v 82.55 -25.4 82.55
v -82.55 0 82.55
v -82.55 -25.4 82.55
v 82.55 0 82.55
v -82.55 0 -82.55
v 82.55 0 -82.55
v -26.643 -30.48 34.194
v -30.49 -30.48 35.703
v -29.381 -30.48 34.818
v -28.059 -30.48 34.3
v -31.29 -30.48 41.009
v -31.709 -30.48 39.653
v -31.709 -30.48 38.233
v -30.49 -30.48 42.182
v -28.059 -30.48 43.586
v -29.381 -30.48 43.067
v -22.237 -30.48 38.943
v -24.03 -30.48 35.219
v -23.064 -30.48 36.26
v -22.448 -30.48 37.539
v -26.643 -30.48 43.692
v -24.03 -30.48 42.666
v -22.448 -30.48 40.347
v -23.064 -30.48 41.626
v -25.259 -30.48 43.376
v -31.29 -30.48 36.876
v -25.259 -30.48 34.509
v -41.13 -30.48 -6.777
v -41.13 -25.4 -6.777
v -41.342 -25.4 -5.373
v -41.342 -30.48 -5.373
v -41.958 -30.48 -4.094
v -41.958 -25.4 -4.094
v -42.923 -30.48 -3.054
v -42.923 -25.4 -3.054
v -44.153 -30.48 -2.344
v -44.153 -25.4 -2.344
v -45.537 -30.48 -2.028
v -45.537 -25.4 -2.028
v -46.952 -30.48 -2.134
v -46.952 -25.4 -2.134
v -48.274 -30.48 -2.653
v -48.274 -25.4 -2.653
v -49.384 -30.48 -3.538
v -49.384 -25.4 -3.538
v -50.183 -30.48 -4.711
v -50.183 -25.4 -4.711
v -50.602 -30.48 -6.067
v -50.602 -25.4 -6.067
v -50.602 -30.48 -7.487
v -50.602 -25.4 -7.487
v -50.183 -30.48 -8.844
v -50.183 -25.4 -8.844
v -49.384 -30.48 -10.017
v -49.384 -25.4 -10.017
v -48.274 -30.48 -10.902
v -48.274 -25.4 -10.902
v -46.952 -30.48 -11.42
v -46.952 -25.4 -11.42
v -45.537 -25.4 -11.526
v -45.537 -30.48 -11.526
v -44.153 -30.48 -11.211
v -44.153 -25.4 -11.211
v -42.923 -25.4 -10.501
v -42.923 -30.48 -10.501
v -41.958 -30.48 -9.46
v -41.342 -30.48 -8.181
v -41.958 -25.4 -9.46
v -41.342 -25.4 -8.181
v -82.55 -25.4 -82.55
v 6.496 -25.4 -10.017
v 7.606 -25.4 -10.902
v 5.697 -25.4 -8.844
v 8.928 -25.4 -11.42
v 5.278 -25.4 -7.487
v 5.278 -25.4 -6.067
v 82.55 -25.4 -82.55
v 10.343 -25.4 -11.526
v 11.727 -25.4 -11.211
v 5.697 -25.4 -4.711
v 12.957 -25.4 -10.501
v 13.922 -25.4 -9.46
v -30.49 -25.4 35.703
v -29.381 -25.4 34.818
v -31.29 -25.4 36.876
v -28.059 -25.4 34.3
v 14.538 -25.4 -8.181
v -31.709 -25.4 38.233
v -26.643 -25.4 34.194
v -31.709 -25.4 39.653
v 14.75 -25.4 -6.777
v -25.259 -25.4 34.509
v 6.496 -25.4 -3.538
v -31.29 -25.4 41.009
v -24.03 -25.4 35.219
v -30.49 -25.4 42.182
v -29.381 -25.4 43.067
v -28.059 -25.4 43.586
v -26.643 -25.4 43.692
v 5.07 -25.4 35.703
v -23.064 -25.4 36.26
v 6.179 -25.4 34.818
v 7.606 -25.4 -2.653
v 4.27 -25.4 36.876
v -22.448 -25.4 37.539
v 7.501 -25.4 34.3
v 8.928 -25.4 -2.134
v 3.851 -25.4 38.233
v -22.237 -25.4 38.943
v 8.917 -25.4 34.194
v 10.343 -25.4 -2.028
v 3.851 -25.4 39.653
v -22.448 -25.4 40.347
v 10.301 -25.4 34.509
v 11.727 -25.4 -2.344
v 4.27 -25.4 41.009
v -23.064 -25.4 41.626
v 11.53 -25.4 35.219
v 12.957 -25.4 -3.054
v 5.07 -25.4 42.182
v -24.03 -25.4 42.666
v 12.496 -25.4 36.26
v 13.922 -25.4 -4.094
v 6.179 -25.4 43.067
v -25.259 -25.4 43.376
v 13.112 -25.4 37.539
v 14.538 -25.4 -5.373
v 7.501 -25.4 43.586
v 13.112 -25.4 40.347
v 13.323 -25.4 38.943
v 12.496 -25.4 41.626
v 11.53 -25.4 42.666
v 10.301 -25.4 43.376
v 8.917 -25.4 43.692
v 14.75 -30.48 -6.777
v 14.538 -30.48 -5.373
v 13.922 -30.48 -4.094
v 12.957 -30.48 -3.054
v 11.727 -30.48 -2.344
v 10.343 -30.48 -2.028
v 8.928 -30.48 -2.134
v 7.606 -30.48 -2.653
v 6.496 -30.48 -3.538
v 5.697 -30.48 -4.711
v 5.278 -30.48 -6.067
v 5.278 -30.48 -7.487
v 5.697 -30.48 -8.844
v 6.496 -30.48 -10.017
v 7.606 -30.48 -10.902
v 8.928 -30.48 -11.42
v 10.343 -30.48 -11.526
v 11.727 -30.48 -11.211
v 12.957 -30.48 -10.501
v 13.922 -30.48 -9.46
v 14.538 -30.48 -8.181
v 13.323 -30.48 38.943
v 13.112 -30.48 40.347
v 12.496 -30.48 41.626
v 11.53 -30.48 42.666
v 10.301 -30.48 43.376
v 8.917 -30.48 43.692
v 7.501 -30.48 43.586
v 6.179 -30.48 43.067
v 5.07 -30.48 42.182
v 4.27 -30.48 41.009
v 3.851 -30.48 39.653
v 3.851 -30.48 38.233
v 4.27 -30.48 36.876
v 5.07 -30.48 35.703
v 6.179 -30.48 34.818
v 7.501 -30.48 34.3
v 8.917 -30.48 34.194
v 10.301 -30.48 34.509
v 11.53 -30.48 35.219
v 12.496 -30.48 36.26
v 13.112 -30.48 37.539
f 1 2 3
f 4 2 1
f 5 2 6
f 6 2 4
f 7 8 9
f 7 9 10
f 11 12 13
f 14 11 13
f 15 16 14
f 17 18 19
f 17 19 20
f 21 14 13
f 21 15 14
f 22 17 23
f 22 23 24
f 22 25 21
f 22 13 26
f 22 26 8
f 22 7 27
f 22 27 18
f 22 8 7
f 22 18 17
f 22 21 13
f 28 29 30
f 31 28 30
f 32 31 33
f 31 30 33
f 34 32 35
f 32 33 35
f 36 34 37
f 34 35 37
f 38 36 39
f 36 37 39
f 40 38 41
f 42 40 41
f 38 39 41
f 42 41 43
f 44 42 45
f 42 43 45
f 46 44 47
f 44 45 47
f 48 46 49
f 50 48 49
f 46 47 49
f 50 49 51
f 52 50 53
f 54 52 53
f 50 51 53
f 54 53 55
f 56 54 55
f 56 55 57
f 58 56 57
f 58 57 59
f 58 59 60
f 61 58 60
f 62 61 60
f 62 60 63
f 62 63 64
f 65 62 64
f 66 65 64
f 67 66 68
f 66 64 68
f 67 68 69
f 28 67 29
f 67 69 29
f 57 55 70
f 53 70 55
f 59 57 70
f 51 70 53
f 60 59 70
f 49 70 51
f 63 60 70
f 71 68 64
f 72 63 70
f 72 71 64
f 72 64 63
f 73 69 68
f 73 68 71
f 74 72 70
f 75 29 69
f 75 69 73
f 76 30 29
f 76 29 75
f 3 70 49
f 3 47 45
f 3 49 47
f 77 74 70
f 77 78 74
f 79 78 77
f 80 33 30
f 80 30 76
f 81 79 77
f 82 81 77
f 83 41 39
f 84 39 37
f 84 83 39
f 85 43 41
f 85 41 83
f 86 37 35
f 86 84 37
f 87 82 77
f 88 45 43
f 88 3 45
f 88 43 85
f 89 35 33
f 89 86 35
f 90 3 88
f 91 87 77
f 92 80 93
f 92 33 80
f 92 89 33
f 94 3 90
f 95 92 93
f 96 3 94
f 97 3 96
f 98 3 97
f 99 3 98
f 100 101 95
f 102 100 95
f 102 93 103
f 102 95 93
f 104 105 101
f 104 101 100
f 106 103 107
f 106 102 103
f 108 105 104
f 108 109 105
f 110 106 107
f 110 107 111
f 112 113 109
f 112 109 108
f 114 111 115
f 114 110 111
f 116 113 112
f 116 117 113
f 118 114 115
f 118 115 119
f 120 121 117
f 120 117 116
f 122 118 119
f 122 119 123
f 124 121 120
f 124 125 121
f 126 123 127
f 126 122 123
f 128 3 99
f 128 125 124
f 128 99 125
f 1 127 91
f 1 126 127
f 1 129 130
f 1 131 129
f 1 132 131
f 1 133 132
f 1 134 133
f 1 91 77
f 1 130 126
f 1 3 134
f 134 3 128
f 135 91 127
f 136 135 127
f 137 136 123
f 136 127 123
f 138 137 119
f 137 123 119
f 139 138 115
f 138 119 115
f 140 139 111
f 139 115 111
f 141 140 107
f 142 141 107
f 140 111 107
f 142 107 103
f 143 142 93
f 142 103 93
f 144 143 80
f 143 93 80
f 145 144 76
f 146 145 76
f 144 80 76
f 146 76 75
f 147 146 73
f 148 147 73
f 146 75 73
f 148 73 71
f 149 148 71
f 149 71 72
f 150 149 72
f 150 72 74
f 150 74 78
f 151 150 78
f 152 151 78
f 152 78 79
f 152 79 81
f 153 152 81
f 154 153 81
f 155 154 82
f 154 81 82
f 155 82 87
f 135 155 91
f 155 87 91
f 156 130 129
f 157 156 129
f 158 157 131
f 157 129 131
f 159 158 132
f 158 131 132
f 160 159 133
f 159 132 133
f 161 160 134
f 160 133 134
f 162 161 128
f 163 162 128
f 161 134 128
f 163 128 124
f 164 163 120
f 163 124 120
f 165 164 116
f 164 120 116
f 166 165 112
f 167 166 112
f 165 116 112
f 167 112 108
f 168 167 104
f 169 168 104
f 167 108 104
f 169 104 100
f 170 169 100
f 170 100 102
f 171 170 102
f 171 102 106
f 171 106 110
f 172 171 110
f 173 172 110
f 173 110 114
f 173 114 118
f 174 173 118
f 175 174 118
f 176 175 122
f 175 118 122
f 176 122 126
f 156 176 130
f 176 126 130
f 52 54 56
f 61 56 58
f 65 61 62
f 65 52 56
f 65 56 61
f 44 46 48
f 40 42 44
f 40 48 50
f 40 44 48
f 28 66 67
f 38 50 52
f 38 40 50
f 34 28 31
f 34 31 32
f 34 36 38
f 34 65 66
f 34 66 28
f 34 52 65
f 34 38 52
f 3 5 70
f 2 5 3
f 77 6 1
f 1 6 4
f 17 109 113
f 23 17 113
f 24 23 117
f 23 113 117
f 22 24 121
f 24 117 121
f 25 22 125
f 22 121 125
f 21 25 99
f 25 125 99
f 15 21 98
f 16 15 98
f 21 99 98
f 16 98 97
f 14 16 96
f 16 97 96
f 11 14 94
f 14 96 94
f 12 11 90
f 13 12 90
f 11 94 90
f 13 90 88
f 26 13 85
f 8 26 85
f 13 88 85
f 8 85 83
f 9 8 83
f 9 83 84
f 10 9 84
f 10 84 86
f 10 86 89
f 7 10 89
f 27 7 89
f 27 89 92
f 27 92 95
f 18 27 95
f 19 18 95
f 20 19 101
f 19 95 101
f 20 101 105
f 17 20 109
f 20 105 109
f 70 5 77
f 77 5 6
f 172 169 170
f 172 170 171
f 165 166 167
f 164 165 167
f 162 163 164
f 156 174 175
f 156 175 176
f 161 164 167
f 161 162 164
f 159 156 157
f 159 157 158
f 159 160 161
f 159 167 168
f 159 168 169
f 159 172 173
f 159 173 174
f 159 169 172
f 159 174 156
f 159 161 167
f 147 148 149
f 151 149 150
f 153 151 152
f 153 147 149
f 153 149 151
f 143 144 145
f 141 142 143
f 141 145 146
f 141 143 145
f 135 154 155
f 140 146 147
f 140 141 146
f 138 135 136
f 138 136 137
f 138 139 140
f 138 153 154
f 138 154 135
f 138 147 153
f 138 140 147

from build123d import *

# Parameters (mm, degrees)
F0_W     = 165.1
F0_H     = 165.1
F1_DEPTH = 25.4
F2_R     = 4.7625
F3_DEPTH = 5.08


with BuildPart() as f1:
    # F0 (on Front) → F1 (new body)
    with BuildSketch(Plane.XZ):
        Rectangle(F0_W, F0_H)
    extrude(amount=F1_DEPTH)

    # F2 (on face) → F3 (join)
    with BuildSketch(Plane.XZ.offset(25.4)):
        with Locations((-26.999259, 38.942747)):
            Circle(F2_R)
        with Locations((8.560741, 38.942747)):
            Circle(F2_R)
        with Locations((-45.89247, -6.777253)):
            Circle(F2_R)
        with Locations((9.98753, -6.777253)):
            Circle(F2_R)
    extrude(amount=F3_DEPTH)


solid = f1.part
